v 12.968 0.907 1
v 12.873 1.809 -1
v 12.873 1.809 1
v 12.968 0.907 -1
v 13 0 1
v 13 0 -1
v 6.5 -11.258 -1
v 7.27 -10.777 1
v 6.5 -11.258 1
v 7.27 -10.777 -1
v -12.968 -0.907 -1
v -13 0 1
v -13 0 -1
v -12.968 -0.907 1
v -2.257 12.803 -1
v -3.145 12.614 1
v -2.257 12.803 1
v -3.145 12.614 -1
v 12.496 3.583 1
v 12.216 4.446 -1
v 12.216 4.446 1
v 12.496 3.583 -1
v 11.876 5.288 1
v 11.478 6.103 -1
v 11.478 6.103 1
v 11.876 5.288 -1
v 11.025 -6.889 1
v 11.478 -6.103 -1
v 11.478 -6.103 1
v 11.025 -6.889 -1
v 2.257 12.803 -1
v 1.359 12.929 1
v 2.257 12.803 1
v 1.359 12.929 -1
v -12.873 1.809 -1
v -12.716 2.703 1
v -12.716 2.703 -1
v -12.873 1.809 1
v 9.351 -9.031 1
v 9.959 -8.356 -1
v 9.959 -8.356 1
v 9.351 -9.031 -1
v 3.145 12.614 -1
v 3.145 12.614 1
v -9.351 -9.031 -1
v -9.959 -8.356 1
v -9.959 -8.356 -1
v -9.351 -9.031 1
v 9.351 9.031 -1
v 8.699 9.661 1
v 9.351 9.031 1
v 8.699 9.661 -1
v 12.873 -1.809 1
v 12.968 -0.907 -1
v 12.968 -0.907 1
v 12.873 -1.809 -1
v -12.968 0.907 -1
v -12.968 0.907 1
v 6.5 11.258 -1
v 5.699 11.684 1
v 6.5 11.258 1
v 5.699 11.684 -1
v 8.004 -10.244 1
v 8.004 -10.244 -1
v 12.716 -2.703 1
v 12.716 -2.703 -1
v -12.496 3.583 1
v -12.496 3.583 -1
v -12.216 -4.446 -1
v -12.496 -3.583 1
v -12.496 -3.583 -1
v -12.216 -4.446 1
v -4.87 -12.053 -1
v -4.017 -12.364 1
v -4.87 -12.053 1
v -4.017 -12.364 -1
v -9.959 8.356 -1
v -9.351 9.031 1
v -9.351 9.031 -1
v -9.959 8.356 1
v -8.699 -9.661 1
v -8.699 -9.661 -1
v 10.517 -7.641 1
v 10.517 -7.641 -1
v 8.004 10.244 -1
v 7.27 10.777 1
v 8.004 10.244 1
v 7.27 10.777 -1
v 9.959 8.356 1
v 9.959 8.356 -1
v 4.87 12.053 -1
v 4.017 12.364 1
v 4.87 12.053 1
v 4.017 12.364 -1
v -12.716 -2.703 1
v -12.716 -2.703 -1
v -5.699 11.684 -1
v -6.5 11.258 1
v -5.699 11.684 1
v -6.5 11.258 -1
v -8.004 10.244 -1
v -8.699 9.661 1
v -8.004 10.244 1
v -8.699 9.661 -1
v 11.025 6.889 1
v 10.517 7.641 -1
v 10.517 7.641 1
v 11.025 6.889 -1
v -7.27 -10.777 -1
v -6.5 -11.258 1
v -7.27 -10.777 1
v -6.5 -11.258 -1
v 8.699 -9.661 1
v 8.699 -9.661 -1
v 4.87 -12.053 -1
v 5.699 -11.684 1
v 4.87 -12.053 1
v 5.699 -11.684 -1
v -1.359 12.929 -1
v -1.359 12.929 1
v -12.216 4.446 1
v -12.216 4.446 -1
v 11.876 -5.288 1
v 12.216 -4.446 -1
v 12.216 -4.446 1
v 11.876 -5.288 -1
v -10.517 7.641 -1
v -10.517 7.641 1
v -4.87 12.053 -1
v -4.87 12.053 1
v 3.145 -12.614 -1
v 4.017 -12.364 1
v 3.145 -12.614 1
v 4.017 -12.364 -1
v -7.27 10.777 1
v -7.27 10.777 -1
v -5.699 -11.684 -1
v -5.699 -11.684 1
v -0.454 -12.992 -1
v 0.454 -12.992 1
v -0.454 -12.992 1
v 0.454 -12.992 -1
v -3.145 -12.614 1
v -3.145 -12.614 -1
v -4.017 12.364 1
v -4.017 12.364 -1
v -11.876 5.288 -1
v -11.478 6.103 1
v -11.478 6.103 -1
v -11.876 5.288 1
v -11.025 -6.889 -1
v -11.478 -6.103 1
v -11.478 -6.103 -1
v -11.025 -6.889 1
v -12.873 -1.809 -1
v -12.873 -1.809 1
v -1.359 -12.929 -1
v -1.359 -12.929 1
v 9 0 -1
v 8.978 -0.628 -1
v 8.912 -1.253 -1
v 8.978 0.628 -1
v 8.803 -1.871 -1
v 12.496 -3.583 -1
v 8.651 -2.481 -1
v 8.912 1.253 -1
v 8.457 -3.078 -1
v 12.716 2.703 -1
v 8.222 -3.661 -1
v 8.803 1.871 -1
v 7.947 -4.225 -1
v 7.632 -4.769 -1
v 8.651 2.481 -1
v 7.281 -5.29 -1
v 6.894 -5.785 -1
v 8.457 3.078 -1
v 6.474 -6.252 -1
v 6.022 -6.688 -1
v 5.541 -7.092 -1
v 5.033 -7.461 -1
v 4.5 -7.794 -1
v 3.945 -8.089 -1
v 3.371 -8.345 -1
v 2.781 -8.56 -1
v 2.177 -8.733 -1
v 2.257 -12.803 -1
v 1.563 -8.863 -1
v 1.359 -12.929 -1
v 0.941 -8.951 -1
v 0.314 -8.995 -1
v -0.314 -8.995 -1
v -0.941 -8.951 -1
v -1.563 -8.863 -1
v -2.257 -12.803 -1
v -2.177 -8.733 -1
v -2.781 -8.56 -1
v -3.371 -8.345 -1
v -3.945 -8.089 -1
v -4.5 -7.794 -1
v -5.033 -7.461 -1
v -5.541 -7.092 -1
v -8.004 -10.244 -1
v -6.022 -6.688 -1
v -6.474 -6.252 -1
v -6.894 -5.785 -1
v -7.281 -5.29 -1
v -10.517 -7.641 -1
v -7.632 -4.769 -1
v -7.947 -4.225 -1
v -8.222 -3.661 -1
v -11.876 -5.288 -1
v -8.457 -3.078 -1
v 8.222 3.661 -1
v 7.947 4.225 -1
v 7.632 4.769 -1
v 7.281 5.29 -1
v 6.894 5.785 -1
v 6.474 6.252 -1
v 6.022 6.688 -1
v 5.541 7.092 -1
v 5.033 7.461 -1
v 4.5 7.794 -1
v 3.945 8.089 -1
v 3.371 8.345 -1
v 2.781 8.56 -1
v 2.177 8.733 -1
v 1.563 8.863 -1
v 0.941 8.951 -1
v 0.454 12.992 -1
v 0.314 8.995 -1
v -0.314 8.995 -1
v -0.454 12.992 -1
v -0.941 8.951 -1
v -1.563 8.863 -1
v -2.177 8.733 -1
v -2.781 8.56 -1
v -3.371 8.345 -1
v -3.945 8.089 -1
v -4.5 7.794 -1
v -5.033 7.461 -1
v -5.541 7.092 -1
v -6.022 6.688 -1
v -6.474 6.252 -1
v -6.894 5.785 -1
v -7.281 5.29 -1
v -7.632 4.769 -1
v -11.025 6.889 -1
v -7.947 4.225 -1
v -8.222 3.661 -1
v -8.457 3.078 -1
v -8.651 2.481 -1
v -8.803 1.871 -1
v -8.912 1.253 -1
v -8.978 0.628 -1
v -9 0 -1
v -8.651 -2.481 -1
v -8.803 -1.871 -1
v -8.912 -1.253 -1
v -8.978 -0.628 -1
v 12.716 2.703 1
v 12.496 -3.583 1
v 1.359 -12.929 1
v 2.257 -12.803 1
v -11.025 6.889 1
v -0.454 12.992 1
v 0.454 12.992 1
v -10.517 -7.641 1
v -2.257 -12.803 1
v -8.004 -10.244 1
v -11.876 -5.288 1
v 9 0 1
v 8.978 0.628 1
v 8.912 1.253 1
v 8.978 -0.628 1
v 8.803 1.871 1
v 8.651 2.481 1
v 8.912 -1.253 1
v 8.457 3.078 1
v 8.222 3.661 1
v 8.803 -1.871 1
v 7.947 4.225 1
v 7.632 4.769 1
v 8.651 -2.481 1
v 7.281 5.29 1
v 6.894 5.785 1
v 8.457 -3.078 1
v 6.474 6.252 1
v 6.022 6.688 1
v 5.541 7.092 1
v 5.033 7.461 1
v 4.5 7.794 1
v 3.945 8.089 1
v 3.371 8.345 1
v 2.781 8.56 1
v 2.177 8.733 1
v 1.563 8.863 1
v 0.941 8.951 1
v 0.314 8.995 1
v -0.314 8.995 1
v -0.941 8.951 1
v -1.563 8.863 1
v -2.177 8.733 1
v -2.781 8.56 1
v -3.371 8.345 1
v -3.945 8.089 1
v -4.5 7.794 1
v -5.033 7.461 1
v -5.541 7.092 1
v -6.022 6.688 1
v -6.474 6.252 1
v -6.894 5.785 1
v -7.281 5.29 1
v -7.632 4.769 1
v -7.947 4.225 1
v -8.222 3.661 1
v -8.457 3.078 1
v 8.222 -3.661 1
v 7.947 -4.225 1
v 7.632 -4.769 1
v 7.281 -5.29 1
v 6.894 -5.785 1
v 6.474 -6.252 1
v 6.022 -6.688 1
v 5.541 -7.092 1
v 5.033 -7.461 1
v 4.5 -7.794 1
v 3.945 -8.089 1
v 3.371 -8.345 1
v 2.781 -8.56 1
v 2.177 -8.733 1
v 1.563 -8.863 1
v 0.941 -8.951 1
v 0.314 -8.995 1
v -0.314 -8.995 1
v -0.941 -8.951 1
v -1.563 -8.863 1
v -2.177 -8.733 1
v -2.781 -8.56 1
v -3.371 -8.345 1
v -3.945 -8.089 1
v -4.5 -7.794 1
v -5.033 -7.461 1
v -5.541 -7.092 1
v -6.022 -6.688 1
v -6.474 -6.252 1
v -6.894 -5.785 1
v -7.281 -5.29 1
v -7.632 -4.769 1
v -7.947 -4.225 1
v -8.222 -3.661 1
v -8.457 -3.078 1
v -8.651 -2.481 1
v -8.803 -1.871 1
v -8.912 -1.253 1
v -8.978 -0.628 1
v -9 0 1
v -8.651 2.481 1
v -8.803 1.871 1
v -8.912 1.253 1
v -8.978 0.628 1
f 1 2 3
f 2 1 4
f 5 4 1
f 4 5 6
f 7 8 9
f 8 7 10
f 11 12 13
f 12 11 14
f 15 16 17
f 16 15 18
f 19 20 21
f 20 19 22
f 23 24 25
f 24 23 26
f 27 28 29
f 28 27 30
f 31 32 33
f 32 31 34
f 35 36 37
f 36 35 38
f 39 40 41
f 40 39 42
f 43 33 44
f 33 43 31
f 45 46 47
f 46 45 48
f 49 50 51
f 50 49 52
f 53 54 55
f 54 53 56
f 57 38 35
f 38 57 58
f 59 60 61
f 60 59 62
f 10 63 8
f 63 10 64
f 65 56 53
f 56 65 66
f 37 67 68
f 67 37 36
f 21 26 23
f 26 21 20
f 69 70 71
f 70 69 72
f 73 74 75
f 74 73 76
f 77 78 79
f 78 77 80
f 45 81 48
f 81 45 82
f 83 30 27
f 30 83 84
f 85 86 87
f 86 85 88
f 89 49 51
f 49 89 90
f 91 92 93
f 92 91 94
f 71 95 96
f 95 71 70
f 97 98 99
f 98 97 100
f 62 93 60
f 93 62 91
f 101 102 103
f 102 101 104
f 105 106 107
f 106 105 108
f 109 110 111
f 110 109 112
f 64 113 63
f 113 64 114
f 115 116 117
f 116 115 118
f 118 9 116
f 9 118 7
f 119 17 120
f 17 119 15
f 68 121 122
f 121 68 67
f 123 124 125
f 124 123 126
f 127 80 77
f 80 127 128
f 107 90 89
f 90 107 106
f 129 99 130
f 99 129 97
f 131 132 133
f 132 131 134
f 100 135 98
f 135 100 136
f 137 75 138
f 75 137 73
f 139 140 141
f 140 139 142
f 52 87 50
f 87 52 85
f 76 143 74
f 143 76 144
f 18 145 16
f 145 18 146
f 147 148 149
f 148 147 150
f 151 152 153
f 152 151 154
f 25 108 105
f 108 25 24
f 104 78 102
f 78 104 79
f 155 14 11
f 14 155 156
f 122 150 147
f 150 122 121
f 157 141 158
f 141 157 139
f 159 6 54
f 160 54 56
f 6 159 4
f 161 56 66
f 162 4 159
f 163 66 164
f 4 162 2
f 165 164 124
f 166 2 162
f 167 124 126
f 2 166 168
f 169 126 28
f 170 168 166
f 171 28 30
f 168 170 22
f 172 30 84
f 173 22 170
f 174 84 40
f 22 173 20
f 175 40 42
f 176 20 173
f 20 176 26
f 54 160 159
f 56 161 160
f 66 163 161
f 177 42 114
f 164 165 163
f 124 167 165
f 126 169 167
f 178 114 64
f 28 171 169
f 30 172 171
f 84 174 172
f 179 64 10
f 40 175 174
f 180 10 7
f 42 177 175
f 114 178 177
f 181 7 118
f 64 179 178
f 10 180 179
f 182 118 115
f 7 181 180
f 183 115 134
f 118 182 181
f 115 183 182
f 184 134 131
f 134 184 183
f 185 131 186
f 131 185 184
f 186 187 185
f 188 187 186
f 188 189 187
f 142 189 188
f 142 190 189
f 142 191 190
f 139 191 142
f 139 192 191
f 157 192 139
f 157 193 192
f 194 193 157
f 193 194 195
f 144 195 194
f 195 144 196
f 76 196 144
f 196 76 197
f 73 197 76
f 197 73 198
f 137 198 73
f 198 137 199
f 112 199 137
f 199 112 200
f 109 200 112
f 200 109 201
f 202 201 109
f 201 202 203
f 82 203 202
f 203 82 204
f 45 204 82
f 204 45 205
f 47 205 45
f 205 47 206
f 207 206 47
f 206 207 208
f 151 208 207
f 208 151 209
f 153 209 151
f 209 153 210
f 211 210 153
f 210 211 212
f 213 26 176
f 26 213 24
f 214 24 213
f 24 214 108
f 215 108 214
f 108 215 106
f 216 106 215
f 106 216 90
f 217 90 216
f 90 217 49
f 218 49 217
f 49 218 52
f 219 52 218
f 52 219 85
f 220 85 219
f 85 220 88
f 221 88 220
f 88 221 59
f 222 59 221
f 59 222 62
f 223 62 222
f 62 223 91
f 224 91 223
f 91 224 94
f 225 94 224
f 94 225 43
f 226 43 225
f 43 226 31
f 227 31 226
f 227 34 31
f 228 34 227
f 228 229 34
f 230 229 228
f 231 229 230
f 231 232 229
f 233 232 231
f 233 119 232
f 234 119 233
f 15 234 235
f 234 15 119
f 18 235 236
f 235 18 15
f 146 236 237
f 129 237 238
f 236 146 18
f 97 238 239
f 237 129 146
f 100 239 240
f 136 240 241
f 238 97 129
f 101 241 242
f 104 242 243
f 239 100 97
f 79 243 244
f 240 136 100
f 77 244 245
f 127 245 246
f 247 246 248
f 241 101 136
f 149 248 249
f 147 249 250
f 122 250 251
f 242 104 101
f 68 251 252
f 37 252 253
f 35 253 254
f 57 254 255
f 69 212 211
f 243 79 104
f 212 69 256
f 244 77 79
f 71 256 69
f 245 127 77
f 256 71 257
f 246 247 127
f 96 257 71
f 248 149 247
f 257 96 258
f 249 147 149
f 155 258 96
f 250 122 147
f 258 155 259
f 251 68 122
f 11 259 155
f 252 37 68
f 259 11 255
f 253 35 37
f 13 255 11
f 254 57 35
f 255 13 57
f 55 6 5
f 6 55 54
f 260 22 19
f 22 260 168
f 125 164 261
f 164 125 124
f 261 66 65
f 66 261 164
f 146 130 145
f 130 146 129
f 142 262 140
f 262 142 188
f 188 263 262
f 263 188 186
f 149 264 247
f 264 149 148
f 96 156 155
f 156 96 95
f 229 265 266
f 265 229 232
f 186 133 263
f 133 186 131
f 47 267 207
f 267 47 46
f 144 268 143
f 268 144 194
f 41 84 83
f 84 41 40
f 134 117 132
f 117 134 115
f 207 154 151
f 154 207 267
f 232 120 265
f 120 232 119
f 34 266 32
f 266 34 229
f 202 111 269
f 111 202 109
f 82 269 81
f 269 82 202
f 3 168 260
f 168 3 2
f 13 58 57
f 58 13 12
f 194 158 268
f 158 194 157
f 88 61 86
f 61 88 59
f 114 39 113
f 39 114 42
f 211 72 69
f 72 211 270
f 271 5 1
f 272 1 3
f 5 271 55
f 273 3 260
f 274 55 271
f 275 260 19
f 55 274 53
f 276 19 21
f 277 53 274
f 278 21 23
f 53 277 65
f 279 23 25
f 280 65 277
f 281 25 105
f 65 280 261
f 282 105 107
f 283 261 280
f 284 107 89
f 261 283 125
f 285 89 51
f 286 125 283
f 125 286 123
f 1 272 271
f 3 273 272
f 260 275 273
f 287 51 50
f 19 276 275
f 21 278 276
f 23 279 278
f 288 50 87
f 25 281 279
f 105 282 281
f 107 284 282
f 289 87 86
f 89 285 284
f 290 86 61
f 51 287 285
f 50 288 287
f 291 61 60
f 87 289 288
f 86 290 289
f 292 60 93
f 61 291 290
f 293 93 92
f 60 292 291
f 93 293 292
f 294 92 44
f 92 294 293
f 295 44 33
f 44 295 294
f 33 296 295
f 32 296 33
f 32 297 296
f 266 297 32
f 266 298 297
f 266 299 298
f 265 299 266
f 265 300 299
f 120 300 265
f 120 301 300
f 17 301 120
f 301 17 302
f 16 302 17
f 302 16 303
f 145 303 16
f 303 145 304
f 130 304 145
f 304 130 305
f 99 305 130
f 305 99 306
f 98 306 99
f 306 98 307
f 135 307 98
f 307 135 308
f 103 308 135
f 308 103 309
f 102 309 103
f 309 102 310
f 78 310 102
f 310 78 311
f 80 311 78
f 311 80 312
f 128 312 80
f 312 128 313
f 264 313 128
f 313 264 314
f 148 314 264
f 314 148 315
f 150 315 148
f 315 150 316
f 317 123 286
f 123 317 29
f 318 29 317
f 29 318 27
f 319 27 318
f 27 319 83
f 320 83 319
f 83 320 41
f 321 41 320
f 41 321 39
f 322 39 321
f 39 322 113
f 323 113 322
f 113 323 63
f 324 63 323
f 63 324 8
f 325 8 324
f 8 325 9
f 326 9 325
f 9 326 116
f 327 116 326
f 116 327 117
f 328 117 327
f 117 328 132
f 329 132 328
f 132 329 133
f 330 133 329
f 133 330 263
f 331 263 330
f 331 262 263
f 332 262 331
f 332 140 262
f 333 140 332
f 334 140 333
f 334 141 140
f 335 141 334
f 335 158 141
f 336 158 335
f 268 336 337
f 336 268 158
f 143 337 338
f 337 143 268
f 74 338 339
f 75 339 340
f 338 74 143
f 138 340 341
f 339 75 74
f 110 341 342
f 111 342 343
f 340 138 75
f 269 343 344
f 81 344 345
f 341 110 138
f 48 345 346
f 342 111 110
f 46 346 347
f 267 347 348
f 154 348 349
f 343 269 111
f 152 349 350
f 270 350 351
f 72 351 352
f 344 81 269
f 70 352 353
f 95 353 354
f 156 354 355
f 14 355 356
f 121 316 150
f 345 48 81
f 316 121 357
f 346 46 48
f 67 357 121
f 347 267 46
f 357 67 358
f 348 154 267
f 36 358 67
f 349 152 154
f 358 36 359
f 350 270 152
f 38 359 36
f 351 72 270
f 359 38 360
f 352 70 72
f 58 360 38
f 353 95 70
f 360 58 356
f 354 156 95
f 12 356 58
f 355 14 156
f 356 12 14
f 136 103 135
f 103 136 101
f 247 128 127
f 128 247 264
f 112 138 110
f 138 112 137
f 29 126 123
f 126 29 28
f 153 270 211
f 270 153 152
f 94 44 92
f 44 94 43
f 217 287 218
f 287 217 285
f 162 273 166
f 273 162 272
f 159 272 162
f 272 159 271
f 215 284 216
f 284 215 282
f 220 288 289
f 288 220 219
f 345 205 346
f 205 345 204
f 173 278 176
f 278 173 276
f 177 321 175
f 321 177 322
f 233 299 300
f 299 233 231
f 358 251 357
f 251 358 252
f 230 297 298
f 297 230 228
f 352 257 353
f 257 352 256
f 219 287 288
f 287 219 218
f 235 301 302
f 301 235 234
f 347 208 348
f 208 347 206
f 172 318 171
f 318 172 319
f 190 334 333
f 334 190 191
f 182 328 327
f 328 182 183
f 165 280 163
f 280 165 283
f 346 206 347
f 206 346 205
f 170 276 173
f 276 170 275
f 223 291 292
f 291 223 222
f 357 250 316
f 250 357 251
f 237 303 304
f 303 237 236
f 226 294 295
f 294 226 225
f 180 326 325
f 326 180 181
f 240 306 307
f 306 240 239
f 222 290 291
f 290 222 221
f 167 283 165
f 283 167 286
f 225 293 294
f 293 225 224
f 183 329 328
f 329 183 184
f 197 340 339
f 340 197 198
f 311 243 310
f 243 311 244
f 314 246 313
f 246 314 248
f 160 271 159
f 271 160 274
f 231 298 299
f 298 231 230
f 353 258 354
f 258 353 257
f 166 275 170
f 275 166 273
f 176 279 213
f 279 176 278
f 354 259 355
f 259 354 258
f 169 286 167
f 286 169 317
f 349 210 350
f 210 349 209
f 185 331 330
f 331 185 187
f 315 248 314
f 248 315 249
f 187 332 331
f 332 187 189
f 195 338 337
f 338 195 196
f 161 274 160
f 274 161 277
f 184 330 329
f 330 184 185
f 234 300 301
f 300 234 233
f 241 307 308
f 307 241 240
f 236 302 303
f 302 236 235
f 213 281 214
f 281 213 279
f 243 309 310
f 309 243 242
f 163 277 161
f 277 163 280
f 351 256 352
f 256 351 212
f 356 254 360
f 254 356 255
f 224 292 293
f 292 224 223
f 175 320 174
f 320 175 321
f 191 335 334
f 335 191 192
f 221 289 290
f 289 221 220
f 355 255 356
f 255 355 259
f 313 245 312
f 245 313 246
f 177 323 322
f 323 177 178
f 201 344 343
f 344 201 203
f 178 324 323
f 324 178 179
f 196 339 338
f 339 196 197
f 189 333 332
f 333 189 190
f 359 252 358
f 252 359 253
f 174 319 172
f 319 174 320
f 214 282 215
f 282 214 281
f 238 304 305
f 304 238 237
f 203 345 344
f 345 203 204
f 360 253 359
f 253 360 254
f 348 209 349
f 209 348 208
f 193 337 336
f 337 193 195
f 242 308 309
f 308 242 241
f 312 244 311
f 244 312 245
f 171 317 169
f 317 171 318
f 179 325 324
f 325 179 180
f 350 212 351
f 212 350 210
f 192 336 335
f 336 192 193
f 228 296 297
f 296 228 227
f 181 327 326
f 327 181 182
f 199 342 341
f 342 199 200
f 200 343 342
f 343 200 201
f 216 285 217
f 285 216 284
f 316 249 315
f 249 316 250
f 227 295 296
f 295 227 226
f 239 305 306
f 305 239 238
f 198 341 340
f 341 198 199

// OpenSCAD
// file: variables.scad
$fn = 90;

socketFittingHeight = 16.5;
socketFittingOuterRadius = 11;
socketFittingInnerRadius = 9.5;
socketMountCenterRadius = 18;
socketMountSideRadius = 8;
socketMountScrewOffset = 22;
socketMountHeight = 4;
socketMountScrewRadius = 2.5;
socketMountScrewPocketDepth = 1;
socketThreadPitch = 2;
socketThreadSize = 1.5;
socketThreadZOffset =  5 + socketMountHeight - socketFittingHeight;
socketLipHeight = .5;

bungOuterRadius = socketFittingInnerRadius - 0.25;
bungBodyHeight = socketFittingHeight;
bungThreadPitch = 2;
bungThreadSize = 1;
bungCapRadius = bungOuterRadius + 4;
bungCapHeight = 4;
bungHandleHeight = 10;
bungHandleFilet = 3;

oringInnerRadius = bungOuterRadius - 0.25;
oringOuterRadius = oringInnerRadius + 4;
oringHeight = 2;

moldMarginXY = 10;
moldMarginZ = 5;
// main file
// Name: Oring
// Description: Oring for the bung/socket interface.
// Created: 30 Aug 2021
// Author: Krisjanis Rijnieks

include <variables.scad>

Oring(
  innerRadius = oringInnerRadius,
  outerRadius = oringOuterRadius,
  height = oringHeight
);

module Oring(innerRadius, outerRadius, height){
  difference(){
    cylinder(r = oringOuterRadius, h = oringHeight, center = true);
    cylinder(r = oringInnerRadius, h = oringHeight + 1, center = true);
  }
}
